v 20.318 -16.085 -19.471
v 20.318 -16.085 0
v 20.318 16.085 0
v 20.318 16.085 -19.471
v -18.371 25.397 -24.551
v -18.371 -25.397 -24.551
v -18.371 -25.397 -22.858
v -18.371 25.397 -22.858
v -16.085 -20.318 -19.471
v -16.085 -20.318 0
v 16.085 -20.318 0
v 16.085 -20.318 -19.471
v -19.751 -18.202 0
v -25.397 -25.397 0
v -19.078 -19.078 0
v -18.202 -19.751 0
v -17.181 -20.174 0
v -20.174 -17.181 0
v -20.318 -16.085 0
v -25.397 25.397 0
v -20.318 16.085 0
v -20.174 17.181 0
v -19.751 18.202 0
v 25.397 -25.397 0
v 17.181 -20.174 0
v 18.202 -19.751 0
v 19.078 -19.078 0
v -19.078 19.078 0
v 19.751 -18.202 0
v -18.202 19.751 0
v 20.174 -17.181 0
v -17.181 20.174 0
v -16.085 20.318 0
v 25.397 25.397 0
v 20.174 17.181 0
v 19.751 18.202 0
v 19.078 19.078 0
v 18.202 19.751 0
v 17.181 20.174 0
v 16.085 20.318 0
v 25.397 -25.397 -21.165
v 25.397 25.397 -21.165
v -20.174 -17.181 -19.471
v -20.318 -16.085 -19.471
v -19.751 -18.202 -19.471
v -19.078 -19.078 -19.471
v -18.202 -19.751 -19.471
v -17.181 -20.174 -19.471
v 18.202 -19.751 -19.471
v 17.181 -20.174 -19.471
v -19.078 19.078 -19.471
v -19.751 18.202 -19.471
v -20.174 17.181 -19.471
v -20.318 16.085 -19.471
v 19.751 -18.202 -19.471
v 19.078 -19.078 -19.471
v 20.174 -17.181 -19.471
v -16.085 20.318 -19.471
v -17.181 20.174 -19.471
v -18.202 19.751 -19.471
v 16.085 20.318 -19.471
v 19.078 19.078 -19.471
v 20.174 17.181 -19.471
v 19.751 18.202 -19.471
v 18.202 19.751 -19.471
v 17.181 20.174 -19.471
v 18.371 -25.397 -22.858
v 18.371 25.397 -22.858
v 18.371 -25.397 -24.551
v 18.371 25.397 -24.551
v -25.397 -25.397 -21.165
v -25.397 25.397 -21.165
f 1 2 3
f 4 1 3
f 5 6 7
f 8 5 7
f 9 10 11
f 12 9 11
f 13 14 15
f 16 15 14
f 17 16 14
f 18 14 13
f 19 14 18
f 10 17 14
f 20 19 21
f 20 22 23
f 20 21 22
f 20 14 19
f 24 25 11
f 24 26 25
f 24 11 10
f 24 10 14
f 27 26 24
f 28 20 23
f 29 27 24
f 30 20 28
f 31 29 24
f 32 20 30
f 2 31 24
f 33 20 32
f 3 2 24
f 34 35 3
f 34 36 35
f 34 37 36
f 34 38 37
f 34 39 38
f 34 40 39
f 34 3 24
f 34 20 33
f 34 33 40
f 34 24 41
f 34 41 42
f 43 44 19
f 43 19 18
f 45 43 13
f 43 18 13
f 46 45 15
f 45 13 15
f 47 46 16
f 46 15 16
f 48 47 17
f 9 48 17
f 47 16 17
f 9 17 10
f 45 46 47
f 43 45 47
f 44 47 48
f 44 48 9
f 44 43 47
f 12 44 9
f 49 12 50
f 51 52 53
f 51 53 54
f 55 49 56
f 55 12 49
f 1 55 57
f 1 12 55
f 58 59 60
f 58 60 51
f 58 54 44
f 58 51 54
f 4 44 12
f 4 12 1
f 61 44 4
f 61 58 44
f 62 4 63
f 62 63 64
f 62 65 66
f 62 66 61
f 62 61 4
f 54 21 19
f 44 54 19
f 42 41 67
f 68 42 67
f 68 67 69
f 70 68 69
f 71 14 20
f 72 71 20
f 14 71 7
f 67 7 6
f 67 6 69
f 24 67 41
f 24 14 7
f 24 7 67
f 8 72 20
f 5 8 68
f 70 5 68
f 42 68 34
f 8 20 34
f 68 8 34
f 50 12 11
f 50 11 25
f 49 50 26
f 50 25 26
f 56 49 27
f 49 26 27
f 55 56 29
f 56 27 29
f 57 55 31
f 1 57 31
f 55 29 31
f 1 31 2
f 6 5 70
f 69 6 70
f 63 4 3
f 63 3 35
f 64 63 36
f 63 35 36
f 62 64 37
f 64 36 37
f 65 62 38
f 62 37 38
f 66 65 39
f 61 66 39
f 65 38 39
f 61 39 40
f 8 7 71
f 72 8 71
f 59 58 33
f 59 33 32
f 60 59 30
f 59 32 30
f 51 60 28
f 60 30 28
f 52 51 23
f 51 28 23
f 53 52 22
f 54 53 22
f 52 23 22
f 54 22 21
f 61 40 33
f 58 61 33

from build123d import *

# Parameters (mm, degrees)
F0_W     = 76.2
F0_H     = 76.2
F1_DEPTH = 36.83
F3_DEPTH = 76.201
F5_DEPTH = 29.21
F6_SCALE = 0.6666


with BuildPart() as f1:
    # F0 (on Top) → F1 (new body)
    with BuildSketch(Plane.XY):
        Rectangle(F0_W, F0_H)
    extrude(amount=-F1_DEPTH)

    # F2 (on face) → F3 (cut, through all)
    with BuildSketch(Plane.XZ.offset(38.1)):
        Polygon((27.559, -34.29), (27.559, -36.83), (38.1, -36.83), (38.1, -31.75), align=None)
        Polygon((-38.1, -36.83), (-27.559, -36.83), (-27.559, -34.29), (-38.1, -31.75), align=None)
    extrude(amount=-F3_DEPTH, mode=Mode.SUBTRACT)

    # F4 (on face) → F5 (cut)
    with BuildSketch(Plane.XY):
        with BuildLine():
            ThreePointArc((30.48, 24.13), (28.6201280605, 28.6201280605), (24.13, 30.48))
            Line((24.13, 30.48), (-24.13, 30.48))
            ThreePointArc((-24.13, 30.48), (-28.6201280605, 28.6201280605), (-30.48, 24.13))
            Line((-30.48, 24.13), (-30.48, -24.13))
            ThreePointArc((-30.48, -24.13), (-28.6201280605, -28.6201280605), (-24.13, -30.48))
            Line((-24.13, -30.48), (24.13, -30.48))
            ThreePointArc((24.13, -30.48), (28.6201280605, -28.6201280605), (30.48, -24.13))
            Line((30.48, -24.13), (30.48, 24.13))
        make_face()
    extrude(amount=-F5_DEPTH, mode=Mode.SUBTRACT)


with BuildPart() as f1_1:
    # F6: moved
    add(f1.part.scale(F6_SCALE))


solid = f1_1.part
